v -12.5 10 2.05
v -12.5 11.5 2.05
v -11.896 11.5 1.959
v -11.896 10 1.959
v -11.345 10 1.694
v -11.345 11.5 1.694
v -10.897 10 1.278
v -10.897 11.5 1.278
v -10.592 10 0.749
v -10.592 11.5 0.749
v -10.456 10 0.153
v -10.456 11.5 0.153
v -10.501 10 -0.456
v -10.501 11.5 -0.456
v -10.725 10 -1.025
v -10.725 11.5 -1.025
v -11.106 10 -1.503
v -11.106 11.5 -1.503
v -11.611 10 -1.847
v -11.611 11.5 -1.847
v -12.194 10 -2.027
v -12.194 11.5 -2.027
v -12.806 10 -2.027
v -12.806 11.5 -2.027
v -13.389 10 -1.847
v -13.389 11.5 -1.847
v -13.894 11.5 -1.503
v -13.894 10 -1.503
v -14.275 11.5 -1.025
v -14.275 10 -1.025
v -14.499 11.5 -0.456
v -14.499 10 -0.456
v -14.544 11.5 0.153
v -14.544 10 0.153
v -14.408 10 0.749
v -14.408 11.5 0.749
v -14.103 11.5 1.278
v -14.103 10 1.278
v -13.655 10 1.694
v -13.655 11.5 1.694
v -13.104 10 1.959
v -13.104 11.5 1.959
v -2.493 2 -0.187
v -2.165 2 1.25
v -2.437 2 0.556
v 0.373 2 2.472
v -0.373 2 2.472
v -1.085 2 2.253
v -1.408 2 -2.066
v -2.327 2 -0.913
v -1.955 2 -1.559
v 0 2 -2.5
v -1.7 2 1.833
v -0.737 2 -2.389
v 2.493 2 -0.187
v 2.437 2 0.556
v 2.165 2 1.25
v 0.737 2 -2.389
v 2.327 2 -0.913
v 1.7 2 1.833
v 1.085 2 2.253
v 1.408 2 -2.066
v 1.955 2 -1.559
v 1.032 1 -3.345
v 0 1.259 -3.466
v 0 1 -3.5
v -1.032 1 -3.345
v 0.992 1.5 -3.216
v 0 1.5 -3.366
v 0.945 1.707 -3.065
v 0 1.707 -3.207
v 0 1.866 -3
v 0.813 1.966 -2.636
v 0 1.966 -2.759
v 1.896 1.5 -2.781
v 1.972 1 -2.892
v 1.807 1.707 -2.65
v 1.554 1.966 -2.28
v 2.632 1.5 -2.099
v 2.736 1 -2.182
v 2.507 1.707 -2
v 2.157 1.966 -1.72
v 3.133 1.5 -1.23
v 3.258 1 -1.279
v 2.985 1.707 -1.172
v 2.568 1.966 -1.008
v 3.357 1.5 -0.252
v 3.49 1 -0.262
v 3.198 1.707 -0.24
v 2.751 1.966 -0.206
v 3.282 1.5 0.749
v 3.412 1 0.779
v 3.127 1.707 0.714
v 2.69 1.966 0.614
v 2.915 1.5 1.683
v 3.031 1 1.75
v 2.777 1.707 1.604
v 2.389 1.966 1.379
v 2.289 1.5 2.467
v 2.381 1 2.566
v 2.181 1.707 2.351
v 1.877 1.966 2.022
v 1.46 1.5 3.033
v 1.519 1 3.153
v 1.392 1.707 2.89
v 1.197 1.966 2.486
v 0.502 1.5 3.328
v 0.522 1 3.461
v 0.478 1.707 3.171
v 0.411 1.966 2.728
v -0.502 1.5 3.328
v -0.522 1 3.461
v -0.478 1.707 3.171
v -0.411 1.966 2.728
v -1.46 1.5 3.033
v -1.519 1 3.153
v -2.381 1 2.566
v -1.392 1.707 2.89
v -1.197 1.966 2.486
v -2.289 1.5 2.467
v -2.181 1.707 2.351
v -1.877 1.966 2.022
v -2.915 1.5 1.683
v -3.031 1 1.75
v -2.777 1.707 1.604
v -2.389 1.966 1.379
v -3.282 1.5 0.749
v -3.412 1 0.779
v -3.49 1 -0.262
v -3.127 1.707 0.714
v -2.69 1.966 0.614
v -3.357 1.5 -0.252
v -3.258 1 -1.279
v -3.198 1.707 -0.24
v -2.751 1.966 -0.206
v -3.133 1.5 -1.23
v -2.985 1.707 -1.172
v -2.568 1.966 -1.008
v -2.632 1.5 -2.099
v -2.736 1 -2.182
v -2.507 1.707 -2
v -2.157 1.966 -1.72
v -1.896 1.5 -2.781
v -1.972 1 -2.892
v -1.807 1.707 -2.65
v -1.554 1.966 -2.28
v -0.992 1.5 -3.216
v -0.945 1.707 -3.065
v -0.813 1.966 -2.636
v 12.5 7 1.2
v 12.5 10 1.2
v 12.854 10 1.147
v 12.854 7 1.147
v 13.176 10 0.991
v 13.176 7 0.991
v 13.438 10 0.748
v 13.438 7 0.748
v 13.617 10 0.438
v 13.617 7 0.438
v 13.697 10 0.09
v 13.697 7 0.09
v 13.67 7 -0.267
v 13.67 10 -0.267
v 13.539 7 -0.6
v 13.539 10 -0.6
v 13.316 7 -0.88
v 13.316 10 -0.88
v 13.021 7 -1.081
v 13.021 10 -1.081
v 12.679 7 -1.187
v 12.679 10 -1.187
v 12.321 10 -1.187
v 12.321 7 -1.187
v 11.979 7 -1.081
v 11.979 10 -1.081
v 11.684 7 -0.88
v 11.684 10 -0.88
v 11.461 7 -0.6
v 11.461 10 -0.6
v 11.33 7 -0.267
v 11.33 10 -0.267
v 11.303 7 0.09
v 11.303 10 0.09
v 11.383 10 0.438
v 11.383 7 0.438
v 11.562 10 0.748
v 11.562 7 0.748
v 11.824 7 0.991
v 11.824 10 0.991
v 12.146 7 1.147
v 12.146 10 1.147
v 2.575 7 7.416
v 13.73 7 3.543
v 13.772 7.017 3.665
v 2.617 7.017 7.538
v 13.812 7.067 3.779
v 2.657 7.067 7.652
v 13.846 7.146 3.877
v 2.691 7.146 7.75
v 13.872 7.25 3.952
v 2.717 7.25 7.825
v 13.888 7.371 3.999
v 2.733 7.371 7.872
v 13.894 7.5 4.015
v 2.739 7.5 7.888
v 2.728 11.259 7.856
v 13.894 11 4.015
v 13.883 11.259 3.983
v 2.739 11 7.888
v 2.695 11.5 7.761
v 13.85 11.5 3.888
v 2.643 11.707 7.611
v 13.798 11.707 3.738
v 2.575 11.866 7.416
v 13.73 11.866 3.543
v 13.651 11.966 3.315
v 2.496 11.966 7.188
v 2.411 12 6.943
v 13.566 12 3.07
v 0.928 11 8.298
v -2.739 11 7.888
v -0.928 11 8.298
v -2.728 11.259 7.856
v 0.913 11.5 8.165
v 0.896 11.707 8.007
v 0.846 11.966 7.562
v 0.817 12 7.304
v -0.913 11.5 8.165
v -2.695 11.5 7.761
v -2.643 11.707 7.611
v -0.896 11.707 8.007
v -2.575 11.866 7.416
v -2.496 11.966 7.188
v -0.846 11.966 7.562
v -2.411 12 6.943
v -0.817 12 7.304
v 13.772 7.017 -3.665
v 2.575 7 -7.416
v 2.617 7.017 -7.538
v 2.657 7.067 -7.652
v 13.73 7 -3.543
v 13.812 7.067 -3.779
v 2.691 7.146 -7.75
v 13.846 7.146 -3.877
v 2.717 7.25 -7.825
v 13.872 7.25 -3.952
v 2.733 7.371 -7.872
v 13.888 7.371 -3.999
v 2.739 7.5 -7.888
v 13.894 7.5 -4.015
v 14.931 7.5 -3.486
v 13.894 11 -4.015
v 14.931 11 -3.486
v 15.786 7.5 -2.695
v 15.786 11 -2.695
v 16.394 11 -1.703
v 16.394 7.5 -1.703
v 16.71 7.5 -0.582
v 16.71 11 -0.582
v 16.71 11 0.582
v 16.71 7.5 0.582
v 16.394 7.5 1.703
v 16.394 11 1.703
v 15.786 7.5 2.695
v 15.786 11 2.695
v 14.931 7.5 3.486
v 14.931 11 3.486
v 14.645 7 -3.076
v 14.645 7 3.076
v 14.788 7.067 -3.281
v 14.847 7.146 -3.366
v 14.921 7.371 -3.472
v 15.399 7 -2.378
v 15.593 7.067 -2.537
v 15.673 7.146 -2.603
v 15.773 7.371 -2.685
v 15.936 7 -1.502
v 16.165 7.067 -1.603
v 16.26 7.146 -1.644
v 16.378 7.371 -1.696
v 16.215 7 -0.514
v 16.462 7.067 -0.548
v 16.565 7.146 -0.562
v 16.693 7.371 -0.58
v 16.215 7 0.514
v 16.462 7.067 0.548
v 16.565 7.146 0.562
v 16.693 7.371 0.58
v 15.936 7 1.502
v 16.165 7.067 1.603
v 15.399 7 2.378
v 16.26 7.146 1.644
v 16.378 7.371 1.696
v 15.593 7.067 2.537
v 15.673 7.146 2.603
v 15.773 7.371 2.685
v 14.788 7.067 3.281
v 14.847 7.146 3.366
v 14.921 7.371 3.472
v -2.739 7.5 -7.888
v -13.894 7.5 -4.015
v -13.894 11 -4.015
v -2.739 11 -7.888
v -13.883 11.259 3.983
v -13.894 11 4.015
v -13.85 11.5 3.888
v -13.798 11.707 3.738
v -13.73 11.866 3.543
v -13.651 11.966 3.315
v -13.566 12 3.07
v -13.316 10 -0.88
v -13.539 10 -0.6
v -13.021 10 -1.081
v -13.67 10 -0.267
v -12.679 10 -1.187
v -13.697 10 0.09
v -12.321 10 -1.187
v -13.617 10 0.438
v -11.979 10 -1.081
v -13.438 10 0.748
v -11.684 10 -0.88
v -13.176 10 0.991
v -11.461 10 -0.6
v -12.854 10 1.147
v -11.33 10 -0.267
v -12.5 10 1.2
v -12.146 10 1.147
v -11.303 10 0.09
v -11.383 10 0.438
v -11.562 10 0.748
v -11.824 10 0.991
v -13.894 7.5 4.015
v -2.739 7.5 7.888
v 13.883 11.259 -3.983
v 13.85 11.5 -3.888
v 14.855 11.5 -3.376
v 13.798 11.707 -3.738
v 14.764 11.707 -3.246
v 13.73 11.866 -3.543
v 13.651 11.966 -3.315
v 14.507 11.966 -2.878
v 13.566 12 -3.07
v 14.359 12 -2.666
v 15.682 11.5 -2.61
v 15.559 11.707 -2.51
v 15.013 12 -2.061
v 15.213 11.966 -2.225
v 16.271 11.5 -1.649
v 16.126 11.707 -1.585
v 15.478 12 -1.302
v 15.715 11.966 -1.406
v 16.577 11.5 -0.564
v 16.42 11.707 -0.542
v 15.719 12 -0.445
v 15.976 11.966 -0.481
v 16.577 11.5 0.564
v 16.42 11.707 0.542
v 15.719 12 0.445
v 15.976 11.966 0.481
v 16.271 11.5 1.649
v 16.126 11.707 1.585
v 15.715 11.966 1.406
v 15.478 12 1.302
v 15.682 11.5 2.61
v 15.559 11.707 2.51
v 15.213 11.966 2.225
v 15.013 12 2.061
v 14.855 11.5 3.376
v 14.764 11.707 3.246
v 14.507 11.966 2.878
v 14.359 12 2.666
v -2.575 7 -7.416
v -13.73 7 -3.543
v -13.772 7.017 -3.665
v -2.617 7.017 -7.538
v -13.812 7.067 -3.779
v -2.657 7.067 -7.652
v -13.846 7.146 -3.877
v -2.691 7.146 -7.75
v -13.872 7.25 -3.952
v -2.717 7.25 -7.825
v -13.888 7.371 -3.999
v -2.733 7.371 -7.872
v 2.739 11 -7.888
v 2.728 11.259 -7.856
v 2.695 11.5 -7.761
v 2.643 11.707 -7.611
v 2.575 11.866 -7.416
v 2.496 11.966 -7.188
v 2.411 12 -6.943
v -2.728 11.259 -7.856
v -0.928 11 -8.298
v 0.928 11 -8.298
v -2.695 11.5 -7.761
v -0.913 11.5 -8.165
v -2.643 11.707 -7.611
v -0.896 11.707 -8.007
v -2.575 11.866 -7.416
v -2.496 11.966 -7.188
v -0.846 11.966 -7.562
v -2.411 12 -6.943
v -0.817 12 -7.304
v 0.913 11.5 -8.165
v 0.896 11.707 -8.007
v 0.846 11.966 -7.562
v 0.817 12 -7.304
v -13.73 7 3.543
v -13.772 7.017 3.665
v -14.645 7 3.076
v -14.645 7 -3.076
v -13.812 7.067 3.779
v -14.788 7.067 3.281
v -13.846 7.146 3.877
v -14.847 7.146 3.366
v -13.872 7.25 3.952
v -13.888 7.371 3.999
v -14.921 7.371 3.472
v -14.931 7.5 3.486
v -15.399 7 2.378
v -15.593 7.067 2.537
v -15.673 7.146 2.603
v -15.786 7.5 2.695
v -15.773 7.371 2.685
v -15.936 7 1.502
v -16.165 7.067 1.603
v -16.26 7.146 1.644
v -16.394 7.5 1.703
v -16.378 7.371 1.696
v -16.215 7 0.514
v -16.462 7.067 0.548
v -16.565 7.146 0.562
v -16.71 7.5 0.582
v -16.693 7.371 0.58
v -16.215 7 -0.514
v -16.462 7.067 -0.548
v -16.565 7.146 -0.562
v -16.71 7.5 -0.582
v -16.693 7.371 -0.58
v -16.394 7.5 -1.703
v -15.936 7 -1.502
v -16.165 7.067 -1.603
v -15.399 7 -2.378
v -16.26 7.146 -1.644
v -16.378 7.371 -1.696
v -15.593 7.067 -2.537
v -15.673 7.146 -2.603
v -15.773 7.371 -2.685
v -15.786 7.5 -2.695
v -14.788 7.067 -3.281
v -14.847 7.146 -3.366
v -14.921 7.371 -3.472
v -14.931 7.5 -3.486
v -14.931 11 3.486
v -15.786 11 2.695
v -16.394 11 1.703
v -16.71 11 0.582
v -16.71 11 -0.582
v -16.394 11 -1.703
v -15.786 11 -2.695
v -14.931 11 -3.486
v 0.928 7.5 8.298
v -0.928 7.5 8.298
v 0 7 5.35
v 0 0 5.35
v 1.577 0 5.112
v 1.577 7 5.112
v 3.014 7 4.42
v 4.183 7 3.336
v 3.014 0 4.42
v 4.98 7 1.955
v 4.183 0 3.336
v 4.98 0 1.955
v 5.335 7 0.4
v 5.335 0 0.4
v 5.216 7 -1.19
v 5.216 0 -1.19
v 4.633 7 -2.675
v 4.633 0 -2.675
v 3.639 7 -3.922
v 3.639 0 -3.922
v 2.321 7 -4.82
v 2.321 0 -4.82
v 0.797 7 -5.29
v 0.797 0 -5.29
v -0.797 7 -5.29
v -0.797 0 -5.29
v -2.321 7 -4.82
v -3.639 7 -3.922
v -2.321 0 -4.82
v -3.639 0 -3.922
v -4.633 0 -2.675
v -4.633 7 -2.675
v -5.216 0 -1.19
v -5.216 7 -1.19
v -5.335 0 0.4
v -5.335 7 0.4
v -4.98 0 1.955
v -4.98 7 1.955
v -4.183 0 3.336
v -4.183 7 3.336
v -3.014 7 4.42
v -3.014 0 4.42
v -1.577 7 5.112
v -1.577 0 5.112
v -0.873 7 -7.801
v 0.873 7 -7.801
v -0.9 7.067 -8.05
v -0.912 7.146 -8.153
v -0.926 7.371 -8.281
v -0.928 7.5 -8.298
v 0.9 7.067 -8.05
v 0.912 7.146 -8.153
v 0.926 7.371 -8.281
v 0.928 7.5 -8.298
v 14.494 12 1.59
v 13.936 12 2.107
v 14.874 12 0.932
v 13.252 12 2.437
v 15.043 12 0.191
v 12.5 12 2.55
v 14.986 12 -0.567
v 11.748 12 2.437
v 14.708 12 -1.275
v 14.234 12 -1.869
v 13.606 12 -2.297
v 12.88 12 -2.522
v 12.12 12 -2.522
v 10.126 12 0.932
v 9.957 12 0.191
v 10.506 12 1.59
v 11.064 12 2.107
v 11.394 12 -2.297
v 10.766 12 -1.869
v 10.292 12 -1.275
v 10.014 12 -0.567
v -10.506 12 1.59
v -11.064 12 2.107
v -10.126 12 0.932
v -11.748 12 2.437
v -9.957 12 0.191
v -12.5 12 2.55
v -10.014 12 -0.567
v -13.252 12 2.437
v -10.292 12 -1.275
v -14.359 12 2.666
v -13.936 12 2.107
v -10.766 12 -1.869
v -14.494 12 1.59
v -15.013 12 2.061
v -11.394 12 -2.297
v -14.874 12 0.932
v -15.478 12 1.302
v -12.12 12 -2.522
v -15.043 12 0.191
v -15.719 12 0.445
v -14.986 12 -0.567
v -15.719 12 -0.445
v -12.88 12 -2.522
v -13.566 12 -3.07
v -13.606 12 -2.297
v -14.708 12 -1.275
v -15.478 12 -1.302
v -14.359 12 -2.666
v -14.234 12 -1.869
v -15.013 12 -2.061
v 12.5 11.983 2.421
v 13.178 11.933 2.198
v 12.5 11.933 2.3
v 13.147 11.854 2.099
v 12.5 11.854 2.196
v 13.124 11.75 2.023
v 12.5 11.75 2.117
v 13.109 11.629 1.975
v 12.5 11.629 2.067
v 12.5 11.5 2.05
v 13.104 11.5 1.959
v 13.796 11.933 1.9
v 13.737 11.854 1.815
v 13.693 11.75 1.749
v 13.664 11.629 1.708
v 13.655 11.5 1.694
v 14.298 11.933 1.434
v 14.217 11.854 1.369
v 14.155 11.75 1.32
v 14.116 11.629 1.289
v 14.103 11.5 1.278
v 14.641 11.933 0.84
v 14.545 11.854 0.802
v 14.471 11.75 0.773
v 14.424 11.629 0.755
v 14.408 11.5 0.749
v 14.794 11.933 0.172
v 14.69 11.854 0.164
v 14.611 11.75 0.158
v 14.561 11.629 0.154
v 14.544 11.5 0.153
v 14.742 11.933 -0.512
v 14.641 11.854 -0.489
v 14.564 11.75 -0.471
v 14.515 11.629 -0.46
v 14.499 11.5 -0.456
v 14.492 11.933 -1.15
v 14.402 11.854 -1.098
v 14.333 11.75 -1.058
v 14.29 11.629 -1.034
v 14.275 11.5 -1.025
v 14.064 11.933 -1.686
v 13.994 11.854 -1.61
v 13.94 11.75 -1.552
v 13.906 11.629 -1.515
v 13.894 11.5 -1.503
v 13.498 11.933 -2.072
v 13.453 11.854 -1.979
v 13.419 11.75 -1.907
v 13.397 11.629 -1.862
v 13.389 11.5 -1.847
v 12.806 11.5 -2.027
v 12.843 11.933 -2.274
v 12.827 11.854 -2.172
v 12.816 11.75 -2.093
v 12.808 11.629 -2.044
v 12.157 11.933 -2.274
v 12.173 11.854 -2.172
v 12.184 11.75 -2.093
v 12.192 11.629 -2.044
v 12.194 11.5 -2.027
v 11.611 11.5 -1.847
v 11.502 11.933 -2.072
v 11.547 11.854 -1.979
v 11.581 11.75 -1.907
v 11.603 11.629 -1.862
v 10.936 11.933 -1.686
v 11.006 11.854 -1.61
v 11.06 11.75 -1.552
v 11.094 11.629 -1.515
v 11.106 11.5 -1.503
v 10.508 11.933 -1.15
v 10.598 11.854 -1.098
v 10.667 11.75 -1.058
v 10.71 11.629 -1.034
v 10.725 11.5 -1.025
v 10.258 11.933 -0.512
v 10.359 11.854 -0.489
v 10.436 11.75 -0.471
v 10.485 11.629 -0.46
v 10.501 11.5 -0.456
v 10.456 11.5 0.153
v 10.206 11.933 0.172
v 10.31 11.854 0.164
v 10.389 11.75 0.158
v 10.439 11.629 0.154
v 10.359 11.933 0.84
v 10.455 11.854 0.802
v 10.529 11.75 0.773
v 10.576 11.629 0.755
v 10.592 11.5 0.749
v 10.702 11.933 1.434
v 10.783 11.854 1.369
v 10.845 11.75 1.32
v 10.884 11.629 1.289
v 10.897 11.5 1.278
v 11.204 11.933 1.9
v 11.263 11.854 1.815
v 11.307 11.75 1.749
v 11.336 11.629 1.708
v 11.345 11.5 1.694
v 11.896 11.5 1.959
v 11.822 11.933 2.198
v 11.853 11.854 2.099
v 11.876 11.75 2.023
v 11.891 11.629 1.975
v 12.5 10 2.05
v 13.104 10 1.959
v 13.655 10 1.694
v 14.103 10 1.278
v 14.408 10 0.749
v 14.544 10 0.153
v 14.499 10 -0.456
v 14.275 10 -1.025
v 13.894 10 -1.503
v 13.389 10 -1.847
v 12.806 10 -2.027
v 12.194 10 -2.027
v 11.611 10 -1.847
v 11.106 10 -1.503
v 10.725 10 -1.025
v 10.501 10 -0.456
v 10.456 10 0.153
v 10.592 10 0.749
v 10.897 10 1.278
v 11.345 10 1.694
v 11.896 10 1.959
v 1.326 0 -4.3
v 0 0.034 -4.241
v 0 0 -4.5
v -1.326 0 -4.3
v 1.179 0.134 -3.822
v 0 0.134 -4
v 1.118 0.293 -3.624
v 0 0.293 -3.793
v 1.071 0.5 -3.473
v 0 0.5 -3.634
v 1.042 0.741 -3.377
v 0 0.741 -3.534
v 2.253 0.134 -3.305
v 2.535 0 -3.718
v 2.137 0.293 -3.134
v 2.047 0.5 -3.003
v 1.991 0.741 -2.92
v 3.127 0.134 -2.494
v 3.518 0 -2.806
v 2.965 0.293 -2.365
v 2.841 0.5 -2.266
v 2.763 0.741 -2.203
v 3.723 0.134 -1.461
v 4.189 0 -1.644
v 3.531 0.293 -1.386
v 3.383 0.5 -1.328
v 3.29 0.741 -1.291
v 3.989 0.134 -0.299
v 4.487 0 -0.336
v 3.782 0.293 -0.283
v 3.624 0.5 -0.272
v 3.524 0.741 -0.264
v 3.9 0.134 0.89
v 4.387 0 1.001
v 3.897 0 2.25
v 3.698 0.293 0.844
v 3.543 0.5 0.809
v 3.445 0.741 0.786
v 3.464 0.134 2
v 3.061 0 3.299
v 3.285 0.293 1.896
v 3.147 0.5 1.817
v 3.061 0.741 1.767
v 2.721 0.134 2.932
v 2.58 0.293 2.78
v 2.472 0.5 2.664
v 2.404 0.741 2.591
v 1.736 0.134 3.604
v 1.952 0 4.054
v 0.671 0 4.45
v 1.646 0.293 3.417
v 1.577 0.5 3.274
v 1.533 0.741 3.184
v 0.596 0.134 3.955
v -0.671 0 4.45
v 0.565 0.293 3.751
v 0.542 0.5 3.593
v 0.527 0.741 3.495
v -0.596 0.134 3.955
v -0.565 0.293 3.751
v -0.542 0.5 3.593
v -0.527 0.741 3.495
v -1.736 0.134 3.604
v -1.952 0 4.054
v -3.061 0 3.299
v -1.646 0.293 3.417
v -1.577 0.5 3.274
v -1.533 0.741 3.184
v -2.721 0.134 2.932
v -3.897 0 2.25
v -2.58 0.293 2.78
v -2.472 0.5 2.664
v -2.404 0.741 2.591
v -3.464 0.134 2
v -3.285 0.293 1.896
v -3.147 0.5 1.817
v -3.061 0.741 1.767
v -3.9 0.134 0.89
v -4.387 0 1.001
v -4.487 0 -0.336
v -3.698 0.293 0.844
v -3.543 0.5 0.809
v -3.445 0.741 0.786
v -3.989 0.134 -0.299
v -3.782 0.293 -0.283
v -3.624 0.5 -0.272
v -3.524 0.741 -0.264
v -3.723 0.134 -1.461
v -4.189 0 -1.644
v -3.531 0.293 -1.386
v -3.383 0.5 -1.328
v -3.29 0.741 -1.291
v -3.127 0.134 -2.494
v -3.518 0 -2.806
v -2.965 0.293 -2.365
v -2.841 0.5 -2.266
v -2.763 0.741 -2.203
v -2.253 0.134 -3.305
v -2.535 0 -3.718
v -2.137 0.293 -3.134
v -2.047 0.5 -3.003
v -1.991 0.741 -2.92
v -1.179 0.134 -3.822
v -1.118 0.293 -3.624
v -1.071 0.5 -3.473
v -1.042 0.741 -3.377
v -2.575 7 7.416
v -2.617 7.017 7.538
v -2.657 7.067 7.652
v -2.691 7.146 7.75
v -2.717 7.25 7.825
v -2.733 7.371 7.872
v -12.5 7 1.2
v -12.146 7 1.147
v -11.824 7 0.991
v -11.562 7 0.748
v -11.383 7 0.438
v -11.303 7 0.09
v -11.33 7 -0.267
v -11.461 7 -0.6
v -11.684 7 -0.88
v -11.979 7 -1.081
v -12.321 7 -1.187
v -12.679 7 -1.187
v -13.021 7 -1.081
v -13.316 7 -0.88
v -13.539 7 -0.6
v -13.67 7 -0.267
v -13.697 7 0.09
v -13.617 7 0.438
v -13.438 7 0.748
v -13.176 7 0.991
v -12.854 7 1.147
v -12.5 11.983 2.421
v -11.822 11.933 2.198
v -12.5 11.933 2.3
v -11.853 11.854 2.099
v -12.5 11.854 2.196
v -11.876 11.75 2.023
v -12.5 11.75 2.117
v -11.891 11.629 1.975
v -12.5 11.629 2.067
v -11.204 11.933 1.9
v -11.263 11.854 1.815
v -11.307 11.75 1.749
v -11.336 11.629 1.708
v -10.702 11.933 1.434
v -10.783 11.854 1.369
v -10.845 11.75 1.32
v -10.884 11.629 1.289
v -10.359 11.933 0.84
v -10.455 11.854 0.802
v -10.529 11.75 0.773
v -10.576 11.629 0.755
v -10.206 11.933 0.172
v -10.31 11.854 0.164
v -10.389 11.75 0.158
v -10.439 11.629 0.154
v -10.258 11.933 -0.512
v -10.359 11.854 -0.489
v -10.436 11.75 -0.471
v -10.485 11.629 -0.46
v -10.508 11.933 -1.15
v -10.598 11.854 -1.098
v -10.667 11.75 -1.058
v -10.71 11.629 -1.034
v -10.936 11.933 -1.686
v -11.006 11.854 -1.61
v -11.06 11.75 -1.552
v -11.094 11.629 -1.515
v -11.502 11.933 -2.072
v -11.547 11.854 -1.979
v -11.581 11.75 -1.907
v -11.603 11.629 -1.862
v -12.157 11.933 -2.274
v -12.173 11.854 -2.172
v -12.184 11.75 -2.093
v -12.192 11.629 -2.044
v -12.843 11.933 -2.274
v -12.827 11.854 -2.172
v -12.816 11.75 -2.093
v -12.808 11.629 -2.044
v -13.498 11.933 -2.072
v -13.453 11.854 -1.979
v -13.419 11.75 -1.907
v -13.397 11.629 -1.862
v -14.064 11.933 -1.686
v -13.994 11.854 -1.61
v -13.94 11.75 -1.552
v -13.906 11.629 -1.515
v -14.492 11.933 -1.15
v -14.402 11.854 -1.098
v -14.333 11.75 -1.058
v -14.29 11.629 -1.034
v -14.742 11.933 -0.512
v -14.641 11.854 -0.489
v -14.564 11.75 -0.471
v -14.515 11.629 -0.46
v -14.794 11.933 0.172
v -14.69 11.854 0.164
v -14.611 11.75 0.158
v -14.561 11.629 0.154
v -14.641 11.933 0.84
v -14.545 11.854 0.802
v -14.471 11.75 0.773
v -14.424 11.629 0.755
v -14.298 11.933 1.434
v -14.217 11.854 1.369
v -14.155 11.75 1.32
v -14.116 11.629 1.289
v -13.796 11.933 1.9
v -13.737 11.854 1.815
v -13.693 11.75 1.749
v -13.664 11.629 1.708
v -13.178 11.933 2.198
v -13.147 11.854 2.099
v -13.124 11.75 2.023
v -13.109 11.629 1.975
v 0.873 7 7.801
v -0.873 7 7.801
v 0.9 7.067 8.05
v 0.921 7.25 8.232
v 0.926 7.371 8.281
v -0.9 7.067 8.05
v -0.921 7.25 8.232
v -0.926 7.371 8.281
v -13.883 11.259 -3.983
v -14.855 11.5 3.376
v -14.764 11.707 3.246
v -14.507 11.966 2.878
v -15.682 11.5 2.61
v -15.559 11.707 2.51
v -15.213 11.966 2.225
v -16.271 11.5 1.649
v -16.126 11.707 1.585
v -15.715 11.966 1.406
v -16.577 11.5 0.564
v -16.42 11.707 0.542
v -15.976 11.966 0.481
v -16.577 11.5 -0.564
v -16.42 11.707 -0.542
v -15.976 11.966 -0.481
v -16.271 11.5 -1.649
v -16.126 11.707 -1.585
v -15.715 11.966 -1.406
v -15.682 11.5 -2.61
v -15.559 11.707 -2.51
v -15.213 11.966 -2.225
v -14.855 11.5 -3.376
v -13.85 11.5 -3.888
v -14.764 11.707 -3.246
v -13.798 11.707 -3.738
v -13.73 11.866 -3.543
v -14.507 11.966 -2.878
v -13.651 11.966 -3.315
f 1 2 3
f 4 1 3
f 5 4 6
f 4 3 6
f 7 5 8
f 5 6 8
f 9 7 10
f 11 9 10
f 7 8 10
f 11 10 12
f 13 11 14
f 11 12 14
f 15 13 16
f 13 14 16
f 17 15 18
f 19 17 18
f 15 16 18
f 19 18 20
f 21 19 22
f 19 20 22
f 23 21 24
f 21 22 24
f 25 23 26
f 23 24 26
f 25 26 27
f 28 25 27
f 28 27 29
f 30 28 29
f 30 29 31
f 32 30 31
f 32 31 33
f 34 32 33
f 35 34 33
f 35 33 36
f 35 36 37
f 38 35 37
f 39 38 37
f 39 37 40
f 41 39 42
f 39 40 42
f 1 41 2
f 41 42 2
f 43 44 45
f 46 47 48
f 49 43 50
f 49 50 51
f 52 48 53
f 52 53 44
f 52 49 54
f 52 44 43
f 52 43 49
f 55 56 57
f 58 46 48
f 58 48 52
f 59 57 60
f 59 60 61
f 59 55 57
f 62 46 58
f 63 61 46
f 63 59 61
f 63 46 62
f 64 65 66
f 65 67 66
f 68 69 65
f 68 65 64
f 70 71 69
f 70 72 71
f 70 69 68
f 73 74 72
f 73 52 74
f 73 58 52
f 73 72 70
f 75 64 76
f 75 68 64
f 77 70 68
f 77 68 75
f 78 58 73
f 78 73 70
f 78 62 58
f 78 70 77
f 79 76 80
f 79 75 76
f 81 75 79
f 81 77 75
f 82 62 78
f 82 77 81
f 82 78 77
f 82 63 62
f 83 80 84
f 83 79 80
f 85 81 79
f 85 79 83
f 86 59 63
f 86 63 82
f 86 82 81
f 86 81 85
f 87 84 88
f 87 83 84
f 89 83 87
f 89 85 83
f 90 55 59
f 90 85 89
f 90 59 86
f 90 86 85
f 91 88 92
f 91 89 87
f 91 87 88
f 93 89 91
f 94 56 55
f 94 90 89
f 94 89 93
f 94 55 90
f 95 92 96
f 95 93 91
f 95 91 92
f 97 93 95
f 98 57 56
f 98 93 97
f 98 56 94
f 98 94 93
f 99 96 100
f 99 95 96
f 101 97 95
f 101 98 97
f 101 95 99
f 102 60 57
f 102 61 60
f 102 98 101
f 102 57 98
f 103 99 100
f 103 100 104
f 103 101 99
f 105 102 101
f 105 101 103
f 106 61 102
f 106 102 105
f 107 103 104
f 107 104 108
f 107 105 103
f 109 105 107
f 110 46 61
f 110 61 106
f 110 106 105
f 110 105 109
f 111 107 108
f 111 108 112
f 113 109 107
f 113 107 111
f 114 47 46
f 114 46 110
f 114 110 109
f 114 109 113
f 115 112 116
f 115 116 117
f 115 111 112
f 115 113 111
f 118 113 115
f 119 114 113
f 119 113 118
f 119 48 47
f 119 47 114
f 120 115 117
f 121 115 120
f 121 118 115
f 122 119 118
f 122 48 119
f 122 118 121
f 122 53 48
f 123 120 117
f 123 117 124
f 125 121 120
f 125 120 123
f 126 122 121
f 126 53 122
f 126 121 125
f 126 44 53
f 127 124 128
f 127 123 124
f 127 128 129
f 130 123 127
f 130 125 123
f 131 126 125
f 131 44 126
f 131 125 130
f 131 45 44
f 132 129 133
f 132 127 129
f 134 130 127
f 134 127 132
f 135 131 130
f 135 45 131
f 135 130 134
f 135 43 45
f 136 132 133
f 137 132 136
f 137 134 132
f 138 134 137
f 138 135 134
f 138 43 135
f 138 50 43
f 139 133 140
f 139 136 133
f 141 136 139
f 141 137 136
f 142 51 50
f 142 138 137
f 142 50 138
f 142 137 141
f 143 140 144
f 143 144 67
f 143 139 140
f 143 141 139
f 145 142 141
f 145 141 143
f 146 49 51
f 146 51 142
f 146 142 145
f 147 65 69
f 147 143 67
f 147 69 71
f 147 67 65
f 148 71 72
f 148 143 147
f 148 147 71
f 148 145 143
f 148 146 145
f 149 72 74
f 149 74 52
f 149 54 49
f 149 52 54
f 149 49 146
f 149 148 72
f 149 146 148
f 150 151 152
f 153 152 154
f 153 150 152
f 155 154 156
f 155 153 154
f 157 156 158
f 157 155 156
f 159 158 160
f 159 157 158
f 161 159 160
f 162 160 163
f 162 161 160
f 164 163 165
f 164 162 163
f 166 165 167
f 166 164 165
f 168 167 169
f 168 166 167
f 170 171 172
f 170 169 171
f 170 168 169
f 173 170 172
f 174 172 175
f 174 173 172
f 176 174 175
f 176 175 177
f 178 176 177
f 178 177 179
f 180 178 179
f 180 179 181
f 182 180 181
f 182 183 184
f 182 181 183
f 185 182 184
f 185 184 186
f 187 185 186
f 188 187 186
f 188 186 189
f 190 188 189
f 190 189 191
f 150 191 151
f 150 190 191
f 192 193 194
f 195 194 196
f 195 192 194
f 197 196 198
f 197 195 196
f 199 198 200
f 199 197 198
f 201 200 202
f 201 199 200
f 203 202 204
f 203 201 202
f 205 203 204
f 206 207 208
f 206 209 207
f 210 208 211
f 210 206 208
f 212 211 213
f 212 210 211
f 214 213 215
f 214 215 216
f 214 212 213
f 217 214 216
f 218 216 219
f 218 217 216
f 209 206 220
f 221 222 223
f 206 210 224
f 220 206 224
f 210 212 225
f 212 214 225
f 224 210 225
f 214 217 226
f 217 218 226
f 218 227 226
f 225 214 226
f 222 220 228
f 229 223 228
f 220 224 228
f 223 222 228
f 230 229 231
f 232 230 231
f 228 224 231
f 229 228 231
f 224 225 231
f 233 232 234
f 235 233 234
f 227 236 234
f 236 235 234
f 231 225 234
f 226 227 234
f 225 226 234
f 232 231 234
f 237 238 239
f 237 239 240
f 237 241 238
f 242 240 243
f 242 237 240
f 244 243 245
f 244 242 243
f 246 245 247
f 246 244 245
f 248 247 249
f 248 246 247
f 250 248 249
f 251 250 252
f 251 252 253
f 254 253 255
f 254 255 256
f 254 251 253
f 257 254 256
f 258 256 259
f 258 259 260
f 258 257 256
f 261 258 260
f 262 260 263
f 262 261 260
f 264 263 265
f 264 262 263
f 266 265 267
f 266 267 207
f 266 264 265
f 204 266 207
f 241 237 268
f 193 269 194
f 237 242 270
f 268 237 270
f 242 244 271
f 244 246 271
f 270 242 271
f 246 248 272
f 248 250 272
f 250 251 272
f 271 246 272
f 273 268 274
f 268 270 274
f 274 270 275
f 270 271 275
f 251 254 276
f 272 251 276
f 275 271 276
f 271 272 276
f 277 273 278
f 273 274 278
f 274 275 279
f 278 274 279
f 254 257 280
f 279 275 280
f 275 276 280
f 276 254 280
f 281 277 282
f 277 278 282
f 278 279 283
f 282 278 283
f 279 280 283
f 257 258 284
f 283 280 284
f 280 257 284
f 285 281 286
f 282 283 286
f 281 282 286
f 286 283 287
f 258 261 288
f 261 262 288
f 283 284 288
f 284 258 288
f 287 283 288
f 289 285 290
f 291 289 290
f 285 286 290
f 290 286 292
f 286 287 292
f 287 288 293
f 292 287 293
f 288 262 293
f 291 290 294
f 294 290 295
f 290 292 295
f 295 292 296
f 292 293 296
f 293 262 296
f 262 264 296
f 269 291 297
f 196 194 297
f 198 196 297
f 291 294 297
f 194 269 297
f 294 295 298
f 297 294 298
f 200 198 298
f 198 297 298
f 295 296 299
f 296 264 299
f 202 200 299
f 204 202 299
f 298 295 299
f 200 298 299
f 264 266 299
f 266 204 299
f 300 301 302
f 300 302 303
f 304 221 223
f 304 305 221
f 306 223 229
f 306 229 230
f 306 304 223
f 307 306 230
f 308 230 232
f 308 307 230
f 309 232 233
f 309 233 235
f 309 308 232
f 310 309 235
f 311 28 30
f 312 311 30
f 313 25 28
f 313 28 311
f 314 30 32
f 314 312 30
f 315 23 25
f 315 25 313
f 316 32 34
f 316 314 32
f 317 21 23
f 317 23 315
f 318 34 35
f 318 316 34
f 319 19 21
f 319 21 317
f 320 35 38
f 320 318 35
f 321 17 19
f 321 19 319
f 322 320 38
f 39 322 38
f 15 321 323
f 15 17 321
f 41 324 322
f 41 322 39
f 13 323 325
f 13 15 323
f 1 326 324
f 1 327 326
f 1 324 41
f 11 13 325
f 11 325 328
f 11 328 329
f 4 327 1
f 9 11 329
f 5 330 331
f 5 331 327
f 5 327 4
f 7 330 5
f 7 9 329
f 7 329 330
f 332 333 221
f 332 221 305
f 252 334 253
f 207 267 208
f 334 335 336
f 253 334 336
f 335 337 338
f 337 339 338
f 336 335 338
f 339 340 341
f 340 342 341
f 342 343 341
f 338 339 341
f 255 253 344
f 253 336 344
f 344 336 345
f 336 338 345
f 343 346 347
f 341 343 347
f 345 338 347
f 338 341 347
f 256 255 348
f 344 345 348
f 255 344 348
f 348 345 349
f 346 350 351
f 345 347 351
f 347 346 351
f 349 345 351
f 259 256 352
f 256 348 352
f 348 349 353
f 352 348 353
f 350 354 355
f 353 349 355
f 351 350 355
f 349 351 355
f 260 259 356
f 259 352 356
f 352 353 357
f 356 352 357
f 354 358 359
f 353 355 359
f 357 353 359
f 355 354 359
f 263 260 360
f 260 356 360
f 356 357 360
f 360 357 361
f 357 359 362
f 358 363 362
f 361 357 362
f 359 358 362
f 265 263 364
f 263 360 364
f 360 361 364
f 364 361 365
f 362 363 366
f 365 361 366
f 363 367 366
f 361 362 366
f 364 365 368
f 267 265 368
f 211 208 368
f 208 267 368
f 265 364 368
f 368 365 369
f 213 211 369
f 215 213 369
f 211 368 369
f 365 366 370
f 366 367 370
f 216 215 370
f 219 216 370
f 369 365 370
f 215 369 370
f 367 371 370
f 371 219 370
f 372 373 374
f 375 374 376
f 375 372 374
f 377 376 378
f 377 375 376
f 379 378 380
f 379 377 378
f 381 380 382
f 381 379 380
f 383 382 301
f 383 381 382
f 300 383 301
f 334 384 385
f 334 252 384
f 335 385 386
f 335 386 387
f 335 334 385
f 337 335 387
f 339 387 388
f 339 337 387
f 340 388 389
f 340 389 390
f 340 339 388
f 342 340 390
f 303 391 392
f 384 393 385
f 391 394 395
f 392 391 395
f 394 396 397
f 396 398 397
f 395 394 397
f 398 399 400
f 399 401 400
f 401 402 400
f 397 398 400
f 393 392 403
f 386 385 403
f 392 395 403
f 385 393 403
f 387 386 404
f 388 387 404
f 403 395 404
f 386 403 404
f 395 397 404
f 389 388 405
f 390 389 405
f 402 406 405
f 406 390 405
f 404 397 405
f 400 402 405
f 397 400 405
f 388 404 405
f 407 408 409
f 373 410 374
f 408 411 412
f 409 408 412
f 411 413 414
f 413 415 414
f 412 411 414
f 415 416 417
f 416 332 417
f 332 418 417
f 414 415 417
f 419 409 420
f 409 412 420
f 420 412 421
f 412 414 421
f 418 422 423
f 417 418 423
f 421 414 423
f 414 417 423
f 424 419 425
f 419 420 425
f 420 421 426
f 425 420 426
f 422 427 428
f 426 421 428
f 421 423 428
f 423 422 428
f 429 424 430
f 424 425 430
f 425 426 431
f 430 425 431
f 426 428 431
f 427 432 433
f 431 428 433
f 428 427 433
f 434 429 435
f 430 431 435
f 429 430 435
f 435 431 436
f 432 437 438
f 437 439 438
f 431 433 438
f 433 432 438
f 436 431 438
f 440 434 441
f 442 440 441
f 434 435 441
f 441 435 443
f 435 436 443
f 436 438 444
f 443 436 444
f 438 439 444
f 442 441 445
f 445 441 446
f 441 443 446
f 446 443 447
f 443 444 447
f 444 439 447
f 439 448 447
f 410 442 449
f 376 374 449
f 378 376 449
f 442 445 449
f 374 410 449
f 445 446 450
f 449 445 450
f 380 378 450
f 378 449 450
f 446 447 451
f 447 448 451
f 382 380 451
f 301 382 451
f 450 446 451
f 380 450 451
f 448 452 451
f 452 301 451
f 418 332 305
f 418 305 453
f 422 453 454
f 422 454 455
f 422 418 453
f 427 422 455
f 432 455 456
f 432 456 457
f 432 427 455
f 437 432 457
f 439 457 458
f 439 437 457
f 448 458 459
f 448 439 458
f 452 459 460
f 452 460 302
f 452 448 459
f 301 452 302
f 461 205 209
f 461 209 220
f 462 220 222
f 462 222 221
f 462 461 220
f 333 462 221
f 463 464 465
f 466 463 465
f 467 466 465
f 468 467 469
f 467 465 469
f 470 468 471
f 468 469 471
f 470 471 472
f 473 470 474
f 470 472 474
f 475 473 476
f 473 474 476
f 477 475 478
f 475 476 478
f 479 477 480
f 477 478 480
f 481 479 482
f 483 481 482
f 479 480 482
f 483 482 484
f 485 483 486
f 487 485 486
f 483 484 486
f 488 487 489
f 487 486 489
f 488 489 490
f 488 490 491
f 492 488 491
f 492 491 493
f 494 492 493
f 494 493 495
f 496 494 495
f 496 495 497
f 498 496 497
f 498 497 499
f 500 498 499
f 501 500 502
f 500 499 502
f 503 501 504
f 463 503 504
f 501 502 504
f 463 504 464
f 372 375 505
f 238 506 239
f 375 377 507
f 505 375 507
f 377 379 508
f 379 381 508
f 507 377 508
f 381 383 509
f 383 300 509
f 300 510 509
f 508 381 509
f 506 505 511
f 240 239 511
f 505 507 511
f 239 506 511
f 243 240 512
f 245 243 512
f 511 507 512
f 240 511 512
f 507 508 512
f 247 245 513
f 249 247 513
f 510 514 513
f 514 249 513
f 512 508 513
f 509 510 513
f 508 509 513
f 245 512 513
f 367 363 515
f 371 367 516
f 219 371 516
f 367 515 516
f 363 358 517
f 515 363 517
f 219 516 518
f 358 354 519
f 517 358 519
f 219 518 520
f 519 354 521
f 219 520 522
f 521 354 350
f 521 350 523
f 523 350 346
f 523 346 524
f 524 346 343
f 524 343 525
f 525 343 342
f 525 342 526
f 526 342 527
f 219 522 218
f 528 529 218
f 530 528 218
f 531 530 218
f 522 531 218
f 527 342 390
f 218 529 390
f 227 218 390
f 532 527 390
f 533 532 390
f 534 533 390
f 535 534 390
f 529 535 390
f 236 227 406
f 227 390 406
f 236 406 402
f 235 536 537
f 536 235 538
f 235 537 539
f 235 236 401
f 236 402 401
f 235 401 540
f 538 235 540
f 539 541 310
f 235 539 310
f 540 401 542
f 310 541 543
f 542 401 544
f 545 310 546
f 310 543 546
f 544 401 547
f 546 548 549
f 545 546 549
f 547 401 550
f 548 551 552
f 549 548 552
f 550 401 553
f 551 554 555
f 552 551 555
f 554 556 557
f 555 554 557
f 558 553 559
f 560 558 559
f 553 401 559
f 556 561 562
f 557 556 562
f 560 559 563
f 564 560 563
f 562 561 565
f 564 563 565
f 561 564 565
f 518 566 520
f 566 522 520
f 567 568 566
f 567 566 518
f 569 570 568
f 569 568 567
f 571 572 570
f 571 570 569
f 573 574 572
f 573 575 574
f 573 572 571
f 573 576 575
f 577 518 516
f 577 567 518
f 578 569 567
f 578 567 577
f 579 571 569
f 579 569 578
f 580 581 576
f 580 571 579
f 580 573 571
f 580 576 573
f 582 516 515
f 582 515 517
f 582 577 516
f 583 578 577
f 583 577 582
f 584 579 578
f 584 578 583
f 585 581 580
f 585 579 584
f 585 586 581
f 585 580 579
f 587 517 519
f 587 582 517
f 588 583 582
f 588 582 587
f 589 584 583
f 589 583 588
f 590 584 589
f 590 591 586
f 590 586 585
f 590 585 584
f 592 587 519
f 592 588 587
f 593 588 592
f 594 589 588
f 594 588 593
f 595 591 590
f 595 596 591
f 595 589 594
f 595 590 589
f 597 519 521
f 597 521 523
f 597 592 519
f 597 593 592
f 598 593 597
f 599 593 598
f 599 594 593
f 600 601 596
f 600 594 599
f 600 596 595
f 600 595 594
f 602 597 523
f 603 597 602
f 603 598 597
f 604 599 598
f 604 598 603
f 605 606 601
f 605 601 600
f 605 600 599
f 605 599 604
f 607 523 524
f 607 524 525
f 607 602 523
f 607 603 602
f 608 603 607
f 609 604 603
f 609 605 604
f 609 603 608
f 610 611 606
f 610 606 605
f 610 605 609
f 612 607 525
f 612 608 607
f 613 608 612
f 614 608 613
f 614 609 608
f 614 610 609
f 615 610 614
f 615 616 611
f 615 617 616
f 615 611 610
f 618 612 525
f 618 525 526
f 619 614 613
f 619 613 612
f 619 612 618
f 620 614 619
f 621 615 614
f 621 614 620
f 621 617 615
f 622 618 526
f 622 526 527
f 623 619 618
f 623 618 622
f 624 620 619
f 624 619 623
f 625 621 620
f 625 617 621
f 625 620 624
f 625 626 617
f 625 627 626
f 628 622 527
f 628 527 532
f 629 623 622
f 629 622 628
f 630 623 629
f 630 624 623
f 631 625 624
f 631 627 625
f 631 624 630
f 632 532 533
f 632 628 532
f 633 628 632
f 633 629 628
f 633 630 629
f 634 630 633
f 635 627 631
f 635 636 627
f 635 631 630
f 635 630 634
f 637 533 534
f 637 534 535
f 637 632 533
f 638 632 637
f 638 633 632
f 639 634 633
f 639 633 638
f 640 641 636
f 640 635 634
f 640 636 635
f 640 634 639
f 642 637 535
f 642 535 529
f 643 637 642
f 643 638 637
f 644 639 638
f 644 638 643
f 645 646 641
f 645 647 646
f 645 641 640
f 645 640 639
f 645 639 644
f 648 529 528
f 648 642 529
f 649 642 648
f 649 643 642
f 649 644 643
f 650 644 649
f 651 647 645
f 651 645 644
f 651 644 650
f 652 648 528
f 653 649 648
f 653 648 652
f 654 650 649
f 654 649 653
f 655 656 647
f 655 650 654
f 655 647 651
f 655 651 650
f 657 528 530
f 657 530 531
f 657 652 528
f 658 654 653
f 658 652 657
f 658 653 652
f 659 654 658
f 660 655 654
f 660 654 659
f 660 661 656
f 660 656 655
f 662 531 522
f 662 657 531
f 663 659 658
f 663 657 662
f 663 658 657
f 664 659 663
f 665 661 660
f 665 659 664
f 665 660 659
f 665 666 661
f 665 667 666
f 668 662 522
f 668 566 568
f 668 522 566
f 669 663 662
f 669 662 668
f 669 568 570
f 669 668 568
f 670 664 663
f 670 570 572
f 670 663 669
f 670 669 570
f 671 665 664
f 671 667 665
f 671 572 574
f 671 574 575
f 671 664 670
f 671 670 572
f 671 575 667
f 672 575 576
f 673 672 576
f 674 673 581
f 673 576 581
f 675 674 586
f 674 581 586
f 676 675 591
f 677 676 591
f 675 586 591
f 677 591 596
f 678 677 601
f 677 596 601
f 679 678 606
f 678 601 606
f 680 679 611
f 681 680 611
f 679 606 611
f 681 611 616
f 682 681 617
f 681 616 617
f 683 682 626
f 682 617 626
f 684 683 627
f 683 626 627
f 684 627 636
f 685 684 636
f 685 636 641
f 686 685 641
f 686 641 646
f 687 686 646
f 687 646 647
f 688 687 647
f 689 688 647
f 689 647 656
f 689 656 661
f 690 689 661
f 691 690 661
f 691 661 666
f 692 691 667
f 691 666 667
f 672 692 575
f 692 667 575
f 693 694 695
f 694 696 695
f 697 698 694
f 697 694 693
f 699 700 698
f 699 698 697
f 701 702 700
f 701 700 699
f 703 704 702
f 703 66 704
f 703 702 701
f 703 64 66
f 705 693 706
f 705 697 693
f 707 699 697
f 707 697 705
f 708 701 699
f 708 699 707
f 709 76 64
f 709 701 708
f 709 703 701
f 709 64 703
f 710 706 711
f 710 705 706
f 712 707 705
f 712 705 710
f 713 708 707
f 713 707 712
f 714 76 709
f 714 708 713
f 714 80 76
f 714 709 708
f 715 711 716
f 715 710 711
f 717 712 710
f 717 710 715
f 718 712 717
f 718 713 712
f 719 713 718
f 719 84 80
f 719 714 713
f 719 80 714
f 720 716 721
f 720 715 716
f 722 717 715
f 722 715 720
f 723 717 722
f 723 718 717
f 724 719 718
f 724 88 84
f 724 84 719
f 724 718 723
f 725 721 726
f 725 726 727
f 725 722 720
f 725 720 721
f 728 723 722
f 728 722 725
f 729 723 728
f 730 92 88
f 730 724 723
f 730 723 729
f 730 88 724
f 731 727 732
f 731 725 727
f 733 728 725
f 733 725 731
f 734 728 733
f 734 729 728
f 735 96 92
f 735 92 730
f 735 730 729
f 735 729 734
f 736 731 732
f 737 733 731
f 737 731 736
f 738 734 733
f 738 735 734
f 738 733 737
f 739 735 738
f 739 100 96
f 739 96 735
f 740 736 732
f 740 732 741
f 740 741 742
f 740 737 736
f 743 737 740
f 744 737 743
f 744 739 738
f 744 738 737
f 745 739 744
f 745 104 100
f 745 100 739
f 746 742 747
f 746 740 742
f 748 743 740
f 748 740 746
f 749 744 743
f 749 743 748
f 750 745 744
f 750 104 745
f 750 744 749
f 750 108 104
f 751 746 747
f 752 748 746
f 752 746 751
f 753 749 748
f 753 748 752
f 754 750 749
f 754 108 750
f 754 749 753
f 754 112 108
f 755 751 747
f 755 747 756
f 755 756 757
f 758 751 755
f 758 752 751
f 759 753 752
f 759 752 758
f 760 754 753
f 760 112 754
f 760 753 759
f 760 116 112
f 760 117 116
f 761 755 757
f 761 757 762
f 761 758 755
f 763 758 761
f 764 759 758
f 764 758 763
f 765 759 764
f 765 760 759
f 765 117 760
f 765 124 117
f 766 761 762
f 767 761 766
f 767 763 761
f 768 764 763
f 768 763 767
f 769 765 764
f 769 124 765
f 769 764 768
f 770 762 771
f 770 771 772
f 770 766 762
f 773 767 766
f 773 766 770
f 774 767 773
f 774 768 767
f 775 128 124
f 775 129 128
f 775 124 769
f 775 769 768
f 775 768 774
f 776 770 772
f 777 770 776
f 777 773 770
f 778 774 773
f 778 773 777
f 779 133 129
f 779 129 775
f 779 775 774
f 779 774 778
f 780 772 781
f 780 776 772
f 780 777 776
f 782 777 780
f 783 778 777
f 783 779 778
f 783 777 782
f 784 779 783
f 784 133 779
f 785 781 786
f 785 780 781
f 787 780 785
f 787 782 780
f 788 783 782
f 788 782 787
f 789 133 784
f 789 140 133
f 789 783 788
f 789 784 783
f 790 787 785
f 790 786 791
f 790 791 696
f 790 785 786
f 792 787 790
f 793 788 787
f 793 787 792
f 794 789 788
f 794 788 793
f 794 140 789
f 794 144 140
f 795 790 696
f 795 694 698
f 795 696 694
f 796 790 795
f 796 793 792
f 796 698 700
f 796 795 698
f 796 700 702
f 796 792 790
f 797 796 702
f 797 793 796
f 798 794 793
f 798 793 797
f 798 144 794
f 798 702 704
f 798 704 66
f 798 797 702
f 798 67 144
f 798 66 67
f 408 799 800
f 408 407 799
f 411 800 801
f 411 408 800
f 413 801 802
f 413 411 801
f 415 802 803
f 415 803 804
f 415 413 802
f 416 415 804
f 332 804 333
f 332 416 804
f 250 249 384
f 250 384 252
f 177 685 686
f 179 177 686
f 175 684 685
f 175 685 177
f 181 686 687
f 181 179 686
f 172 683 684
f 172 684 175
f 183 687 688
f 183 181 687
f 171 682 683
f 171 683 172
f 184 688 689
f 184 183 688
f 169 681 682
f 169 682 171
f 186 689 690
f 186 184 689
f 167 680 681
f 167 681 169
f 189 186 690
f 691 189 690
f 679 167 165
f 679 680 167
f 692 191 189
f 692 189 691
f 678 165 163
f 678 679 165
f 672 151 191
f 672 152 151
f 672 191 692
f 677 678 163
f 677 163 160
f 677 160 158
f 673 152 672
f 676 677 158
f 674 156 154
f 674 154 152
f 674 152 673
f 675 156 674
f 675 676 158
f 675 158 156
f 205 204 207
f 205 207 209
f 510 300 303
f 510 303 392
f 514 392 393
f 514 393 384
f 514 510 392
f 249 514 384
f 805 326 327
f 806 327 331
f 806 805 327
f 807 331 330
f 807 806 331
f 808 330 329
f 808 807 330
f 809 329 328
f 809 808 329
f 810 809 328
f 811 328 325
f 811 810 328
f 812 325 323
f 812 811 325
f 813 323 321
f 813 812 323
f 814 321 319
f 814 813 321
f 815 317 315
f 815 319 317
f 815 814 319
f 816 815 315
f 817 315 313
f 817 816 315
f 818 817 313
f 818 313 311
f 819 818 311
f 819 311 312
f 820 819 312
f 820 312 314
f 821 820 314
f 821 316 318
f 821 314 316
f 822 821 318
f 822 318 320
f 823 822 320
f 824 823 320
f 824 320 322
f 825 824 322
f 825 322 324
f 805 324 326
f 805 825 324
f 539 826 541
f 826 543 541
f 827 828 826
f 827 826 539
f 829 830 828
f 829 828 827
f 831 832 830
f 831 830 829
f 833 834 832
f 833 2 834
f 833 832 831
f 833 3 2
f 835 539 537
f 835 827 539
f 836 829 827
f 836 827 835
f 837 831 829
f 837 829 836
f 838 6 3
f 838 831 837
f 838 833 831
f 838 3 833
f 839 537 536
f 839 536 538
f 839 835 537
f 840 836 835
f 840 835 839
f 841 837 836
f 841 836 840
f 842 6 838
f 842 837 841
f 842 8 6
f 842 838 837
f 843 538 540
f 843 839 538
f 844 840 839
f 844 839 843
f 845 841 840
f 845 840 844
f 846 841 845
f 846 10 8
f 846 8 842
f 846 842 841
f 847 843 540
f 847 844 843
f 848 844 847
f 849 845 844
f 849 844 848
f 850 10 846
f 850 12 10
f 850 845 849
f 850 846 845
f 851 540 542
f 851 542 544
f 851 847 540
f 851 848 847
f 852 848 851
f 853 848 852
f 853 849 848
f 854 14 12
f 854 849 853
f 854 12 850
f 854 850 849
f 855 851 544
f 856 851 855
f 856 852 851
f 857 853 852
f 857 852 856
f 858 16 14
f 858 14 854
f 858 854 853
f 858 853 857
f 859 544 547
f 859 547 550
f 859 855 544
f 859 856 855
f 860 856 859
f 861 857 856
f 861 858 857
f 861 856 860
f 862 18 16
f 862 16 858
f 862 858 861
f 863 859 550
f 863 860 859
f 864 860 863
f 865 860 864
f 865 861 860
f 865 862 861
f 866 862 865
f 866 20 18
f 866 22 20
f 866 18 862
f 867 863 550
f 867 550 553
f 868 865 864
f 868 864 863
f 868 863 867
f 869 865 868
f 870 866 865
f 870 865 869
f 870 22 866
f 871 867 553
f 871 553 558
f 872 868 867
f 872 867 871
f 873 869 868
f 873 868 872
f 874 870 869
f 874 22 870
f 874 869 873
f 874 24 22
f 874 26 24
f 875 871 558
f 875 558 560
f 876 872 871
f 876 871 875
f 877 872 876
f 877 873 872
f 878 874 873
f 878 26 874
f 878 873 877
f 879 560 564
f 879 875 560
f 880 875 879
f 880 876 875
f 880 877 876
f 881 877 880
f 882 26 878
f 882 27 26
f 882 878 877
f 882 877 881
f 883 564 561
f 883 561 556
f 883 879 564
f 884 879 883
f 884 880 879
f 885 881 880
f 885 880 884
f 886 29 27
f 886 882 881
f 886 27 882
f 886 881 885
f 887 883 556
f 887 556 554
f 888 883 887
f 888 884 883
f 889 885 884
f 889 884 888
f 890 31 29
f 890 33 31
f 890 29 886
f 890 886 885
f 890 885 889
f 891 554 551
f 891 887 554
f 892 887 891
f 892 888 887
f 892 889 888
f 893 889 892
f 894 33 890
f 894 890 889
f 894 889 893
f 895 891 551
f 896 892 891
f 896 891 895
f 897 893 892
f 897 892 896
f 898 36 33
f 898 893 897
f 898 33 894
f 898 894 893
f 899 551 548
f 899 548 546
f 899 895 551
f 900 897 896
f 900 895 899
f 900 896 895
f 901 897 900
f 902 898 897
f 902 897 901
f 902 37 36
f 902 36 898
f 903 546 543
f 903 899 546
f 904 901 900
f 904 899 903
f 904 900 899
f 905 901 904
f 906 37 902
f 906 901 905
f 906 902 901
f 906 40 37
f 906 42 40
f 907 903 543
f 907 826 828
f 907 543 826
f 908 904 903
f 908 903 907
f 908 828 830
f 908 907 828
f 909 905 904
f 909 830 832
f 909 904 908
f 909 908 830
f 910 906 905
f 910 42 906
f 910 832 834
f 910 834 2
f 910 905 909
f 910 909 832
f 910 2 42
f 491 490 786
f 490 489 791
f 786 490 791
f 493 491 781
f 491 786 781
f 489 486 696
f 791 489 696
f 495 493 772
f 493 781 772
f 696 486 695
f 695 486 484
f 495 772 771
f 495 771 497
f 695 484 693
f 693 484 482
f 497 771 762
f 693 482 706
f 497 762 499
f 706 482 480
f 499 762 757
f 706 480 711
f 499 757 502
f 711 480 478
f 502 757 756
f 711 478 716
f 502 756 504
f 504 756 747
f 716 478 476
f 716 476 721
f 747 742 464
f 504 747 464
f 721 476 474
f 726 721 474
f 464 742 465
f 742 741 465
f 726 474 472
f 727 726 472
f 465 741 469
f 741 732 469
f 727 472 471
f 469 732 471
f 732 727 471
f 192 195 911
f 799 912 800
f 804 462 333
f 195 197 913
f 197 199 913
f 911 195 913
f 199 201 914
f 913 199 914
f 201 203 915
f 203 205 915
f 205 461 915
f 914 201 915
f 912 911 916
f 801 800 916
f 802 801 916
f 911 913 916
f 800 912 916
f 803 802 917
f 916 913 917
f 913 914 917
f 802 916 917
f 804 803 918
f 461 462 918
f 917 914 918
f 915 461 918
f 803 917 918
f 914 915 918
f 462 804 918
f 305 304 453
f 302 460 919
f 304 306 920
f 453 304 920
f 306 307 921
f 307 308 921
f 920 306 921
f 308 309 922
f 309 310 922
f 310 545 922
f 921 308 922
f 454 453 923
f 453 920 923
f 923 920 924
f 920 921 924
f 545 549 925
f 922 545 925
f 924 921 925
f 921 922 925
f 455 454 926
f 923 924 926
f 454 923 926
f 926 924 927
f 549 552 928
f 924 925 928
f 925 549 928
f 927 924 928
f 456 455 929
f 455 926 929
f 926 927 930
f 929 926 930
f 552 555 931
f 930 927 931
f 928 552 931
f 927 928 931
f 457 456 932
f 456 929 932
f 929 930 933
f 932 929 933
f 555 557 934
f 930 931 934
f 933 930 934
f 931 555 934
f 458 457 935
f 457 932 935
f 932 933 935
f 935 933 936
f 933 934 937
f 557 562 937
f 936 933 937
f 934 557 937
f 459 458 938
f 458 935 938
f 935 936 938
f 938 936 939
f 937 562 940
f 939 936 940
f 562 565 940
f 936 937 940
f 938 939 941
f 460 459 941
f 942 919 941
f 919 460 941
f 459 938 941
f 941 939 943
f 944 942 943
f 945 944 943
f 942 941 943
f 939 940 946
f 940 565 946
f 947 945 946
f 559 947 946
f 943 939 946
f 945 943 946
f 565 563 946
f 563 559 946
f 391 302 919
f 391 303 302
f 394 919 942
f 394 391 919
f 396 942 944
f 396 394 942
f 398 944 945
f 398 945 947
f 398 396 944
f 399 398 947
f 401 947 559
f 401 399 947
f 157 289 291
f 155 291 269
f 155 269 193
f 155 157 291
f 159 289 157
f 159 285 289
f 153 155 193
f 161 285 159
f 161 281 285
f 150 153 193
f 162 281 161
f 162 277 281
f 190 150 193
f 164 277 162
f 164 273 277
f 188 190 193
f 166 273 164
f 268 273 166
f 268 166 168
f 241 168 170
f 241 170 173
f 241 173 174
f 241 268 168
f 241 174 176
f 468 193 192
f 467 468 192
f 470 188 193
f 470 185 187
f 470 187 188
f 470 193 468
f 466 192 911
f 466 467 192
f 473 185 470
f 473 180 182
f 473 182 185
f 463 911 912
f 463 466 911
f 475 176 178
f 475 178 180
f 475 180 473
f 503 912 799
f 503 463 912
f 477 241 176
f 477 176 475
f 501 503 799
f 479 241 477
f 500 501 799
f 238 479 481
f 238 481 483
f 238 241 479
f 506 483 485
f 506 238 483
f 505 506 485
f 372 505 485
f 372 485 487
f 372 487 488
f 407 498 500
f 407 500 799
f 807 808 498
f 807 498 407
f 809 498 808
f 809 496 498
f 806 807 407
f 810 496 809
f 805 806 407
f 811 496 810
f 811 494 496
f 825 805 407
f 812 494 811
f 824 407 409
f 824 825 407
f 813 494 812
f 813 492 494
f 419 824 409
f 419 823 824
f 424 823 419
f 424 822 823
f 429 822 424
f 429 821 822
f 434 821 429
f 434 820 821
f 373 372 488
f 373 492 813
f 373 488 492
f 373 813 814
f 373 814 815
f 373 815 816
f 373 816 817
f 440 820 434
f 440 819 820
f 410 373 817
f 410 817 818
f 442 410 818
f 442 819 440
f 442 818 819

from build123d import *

# Parameters (mm, degrees)
SKETCH1_R           = 5.35
BOSS_EXTRUDE1_DEPTH = 7
SKETCH2_R           = 1.2
BOSS_EXTRUDE2_DEPTH = 5
SKETCH3_R           = 2.05
CUT_EXTRUDE1_DEPTH  = 2
FILLET1_R           = 0.5
FILLET2_R           = 1
SKETCH4_R           = 3.5
CUT_EXTRUDE2_DEPTH  = 2
FILLET3_R           = 1


with BuildPart() as part:
    # Sketch1 → Boss-Extrude1 (new body)
    with BuildSketch(Plane(origin=(0, 0, 0), x_dir=(1, 0, 0), z_dir=(0, 1, 0))):
        with Locations(Location((0, 0, 0), (0, 0, 270))):
            Circle(SKETCH1_R)
    extrude(amount=BOSS_EXTRUDE1_DEPTH)

    # Sketch2 → Boss-Extrude2 (add)
    with BuildSketch(Plane(origin=(0, 7, 0), x_dir=(1, 0, 0), z_dir=(0, 1, 0))):
        with BuildLine():
            Line((2.7388, 7.888058986), (13.894, 4.014880322))
            ThreePointArc((13.894, 4.014880322), (16.75, 0), (13.894, -4.014880322))
            Line((13.894, -4.014880322), (2.7388, -7.888058986))
            ThreePointArc((2.7388, -7.888058986), (0, -8.35), (-2.7388, -7.888058986))
            Line((-2.7388, -7.888058986), (-13.894, -4.014880322))
            ThreePointArc((-13.894, -4.014880322), (-16.75, 0), (-13.894, 4.014880322))
            Line((-13.894, 4.014880322), (-2.7388, 7.888058986))
            ThreePointArc((-2.7388, 7.888058986), (0, 8.35), (2.7388, 7.888058986))
        make_face()
        with Locations(Location((12.5, 0, 0), (0, 0, 270))):
            Circle(SKETCH2_R, mode=Mode.SUBTRACT)
        with Locations(Location((-12.5, 0, 0), (0, 0, 270))):
            Circle(SKETCH2_R, mode=Mode.SUBTRACT)
    extrude(amount=BOSS_EXTRUDE2_DEPTH)

    # Sketch3 → Cut-Extrude1 (cut)
    with BuildSketch(Plane(origin=(0, 12, 0), x_dir=(1, 0, 0), z_dir=(0, 1, 0))):
        with Locations(Location((-12.5, 0, 0), (0, 0, 270))):
            Circle(SKETCH3_R)
        with Locations(Location((12.5, 0, 0), (0, 0, 270))):
            Circle(SKETCH3_R)
    extrude(amount=-CUT_EXTRUDE1_DEPTH, mode=Mode.SUBTRACT)

    # Fillet1
    fillet1_edges = [part.edges().sort_by_distance(p)[0] for p in [
        (-8.3164, 7, 5.951469654),
        (0, 7, 8.35),
        (8.3164, 7, 5.951469654),
        (16.75, 7, 0),
        (8.3164, 7, -5.951469654),
        (-12.5, 12, -2.05),
        (12.5, 12, -2.05),
        (0, 7, -8.35),
        (-8.3164, 7, -5.951469654),
        (-16.75, 7, 0),
    ]]
    fillet(fillet1_edges, radius=FILLET1_R)

    # Fillet2
    fillet2_edges = [part.edges().sort_by_distance(p)[0] for p in [
        (0, 12, -8.35),
        (-8.3164, 12, -5.951469654),
        (-16.75, 12, 0),
        (-8.3164, 12, 5.951469654),
        (0, 12, 8.35),
        (8.3164, 12, 5.951469654),
        (16.75, 12, 0),
        (8.3164, 12, -5.951469654),
    ]]
    fillet(fillet2_edges, radius=FILLET2_R)

    # Sketch4 → Cut-Extrude2 (cut)
    with BuildSketch(Plane.XZ):
        with Locations(Location((0, 0, 0), (0, 0, 270))):
            Circle(SKETCH4_R)
    extrude(amount=-CUT_EXTRUDE2_DEPTH, mode=Mode.SUBTRACT)

    # Fillet3
    fillet3_edges = [part.edges().sort_by_distance(p)[0] for p in [
        (0, 2, 3.5),
        (0, 0, 3.5),
    ]]
    fillet(fillet3_edges, radius=FILLET3_R - 0.0001)  # a hair under: the kernel refuses the full size


solid = part.part
